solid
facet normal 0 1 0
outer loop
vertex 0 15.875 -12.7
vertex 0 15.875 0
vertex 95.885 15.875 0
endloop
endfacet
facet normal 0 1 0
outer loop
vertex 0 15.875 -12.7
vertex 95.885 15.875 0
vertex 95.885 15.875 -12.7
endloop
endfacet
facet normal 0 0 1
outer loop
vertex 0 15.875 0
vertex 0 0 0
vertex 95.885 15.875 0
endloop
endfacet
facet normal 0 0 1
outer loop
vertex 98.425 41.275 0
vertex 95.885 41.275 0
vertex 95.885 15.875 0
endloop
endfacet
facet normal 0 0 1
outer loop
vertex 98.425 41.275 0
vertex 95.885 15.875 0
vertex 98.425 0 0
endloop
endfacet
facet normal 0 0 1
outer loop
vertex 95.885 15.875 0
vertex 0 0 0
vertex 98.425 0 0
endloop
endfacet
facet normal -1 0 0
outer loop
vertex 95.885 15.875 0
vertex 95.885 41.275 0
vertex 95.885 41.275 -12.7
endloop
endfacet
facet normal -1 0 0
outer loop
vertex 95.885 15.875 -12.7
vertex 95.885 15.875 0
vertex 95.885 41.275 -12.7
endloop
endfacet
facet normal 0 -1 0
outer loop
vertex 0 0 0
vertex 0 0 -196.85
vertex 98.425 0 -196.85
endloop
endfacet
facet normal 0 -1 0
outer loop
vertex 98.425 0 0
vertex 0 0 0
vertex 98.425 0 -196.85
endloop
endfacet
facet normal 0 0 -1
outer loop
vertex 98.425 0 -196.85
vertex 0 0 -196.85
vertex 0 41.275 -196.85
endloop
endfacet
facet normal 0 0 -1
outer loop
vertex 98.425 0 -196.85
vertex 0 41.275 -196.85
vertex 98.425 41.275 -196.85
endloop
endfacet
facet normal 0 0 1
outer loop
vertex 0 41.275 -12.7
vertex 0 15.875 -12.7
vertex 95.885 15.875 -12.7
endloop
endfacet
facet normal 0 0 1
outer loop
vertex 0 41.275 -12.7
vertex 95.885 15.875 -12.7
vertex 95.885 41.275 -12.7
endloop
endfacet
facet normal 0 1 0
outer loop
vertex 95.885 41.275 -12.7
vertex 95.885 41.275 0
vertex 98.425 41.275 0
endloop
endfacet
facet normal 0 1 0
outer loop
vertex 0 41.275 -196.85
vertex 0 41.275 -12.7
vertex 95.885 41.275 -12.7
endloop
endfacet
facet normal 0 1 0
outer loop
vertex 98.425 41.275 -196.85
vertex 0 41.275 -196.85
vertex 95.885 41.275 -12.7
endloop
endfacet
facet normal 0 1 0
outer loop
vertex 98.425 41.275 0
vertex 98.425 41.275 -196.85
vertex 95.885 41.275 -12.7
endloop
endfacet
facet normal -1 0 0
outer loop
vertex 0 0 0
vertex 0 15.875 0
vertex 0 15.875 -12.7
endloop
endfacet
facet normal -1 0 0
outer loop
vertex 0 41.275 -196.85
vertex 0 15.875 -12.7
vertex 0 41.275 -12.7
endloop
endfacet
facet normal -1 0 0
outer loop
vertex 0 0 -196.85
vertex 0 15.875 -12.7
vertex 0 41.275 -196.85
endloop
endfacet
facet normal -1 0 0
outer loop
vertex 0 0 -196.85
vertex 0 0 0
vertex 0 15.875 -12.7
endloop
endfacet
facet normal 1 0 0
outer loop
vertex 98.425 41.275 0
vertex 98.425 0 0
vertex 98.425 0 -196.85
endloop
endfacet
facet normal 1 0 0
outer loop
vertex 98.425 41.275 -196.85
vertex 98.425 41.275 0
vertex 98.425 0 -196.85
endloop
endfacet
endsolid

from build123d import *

# Parameters (mm, degrees)
SKETCH1_W           = 98.425
SKETCH1_H           = 196.85
BOSS_EXTRUDE1_DEPTH = 41.275
CUT_EXTRUDE1_START  = -98.425
SKETCH2_W           = 12.7
SKETCH2_H           = 25.4
CUT_EXTRUDE1_DEPTH  = 95.885


with BuildPart() as part:
    # Sketch1 → Boss-Extrude1 (new body)
    with BuildSketch(Plane(origin=(0, 0, 0), x_dir=(1, 0, 0), z_dir=(0, 1, 0))):
        with Locations((49.2125, 98.425)):
            Rectangle(SKETCH1_W, SKETCH1_H)
    extrude(amount=BOSS_EXTRUDE1_DEPTH)

    # Sketch2 → Cut-Extrude1 (cut)
    with BuildSketch(Plane(origin=(98.425, 0, 0), x_dir=(0, 0, -1), z_dir=(1, 0, 0)).offset(CUT_EXTRUDE1_START)):
        with Locations((6.35, 28.575)):
            Rectangle(SKETCH2_W, SKETCH2_H)
    extrude(amount=CUT_EXTRUDE1_DEPTH, mode=Mode.SUBTRACT)


solid = part.part
